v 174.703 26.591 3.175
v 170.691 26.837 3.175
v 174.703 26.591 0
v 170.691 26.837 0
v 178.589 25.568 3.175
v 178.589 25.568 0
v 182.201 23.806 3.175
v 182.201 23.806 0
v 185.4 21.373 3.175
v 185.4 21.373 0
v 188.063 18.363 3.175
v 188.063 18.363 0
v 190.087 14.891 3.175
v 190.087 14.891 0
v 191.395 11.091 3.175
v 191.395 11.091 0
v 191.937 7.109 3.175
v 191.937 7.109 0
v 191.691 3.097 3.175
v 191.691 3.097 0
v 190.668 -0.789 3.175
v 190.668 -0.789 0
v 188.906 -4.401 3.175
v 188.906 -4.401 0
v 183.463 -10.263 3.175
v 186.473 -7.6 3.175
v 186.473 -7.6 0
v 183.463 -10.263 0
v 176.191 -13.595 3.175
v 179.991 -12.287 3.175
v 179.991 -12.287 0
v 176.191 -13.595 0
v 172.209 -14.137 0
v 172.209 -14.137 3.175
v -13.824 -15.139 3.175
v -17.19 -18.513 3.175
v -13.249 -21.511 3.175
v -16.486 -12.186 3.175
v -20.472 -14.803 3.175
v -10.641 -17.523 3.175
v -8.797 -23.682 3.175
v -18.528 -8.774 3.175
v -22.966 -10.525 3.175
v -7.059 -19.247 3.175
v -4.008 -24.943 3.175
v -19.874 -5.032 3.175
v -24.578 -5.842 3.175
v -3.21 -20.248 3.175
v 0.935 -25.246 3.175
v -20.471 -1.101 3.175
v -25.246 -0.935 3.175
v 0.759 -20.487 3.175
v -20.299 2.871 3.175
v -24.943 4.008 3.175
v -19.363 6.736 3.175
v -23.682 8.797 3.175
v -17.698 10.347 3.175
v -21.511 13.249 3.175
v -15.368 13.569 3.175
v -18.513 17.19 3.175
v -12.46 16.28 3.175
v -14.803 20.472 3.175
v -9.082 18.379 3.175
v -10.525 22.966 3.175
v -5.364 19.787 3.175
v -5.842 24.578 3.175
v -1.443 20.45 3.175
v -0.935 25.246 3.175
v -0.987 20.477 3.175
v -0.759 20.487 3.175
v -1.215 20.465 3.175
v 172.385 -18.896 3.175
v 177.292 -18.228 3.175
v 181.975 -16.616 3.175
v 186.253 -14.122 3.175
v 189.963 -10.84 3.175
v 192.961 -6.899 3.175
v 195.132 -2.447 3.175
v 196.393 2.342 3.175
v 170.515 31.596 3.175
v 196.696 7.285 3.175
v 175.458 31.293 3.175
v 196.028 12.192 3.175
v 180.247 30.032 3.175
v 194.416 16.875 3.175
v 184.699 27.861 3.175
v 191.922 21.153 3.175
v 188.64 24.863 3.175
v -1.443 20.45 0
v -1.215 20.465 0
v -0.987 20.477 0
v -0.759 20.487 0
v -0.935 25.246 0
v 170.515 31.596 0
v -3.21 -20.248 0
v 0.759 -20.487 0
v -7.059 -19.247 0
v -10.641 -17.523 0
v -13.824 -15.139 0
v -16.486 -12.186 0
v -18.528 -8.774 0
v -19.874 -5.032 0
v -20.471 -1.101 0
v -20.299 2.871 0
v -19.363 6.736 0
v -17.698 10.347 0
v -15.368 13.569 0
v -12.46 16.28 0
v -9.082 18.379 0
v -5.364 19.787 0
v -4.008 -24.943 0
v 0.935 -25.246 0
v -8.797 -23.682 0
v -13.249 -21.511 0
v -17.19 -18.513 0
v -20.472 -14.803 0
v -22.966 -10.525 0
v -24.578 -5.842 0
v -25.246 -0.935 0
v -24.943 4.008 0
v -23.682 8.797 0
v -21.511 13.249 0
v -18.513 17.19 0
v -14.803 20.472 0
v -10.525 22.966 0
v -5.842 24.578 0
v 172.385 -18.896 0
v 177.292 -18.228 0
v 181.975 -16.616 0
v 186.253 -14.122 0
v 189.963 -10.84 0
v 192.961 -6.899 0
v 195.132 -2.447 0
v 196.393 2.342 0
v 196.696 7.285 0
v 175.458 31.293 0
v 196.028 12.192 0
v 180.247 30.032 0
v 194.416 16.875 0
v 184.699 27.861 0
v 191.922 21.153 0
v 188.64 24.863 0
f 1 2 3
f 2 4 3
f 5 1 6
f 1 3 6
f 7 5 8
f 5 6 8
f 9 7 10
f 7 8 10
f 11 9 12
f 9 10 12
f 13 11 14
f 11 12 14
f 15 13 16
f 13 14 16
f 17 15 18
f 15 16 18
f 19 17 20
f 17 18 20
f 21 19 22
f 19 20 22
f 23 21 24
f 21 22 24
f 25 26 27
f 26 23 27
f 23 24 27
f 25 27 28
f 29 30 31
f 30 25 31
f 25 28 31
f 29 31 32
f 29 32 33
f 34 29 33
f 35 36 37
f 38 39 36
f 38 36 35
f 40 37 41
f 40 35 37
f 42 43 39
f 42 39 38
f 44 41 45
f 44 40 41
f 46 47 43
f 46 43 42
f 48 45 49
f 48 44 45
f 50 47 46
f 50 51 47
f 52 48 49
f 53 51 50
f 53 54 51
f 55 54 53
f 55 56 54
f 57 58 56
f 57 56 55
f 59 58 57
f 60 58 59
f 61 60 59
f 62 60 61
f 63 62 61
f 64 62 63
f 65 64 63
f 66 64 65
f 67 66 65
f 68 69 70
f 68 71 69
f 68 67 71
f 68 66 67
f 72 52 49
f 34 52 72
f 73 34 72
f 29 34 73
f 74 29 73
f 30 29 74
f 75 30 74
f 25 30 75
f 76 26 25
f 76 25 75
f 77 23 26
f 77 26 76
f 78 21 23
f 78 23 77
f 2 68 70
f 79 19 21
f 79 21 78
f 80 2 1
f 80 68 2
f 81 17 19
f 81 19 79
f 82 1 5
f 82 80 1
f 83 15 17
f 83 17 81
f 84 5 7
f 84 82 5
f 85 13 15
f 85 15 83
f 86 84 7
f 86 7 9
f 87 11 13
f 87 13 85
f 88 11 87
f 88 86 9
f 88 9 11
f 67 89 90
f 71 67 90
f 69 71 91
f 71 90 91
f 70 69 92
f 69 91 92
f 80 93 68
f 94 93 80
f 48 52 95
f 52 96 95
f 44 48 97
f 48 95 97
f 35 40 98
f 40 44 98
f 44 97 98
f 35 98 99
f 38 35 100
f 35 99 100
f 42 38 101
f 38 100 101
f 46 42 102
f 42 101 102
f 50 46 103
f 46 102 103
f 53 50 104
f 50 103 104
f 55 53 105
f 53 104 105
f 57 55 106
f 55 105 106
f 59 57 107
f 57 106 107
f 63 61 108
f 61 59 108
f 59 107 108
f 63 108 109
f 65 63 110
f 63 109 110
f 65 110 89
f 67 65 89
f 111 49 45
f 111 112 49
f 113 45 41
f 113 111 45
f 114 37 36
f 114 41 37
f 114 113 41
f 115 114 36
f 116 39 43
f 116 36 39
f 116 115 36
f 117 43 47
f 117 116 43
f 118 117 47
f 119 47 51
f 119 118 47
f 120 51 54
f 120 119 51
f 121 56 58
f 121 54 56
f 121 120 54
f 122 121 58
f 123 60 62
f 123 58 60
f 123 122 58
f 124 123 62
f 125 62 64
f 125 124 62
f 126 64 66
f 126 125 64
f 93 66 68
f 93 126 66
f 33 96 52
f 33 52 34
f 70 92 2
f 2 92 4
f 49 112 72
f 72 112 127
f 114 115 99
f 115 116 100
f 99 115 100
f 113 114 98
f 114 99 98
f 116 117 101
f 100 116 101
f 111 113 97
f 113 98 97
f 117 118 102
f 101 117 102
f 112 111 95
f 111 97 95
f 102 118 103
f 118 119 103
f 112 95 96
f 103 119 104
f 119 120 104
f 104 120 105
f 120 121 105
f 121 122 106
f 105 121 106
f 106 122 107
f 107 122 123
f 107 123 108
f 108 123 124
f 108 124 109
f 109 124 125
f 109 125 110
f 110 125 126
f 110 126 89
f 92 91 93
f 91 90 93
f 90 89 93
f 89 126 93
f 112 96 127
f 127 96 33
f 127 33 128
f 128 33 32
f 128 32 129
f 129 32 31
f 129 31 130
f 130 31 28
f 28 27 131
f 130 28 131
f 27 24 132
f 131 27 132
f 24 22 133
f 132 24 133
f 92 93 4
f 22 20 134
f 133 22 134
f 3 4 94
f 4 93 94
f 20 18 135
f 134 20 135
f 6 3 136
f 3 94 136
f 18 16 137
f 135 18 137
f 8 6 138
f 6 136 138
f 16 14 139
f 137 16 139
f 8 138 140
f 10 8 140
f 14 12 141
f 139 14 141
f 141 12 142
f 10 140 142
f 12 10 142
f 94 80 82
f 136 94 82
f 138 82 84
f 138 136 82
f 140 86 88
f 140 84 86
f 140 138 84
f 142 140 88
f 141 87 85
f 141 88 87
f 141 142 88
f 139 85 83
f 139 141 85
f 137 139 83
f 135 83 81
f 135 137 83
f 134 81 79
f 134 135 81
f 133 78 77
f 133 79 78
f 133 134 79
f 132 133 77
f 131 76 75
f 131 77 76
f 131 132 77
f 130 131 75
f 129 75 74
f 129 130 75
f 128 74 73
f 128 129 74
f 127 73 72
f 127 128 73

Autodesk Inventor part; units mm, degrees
ref_plane "YZ Plane" through (0, 0, 0) normal (1, 0, 0) x (0, 1, 0)
ref_plane "XZ Plane" through (0, 0, 0) normal (0, 1, 0) x (-1, 0, 0)
ref_plane "XY Plane" through (0, 0, 0) normal (0, 0, 1) x (1, 0, 0)
sketch "Sketch1" plane through (0, 0, 0) normal (0, 0, 1) x (1, 0, 0)
  arc A0 (3.487, 25.0215) -> (1.7914, 25.1997) centre (0, 0) ccw
  arc A1 (5.6634, 19.703) -> (-1.4432, 20.4499) centre (0, 0) ccw
  arc A2 (164.4584, 30.6266) -> (162.8369, 30.0997) centre (171.45, 6.35) ccw
  arc A3 (168.6099, 26.6531) -> (161.8138, 24.4449) centre (171.45, 6.35) ccw
  arc A4 (172.385, -18.896) -> (170.515, 31.596) centre (171.45, 6.35) ccw
  arc A5 (172.2088, -14.1368) -> (170.6912, 26.8368) centre (171.45, 6.35) ccw
  arc A6 (-0.935, 25.246) -> (0.935, -25.246) centre (0, 0) ccw
  arc A7 (-0.7588, 20.4868) -> (0.7588, -20.4868) centre (0, 0) ccw
  line L0 (-0.935, 25.246) -> (170.515, 31.596)
  line L1 (0.935, -25.246) -> (172.385, -18.896)
  line L2 (-0.7588, 20.4868) -> (170.6912, 26.8368)
  line L3 (0.7588, -20.4868) -> (172.2088, -14.1368)
  point P0 (0, 0)
extrude "Extrusion1" add sketch "Sketch1" along normal blind 3.175
properties part number "Chain"
